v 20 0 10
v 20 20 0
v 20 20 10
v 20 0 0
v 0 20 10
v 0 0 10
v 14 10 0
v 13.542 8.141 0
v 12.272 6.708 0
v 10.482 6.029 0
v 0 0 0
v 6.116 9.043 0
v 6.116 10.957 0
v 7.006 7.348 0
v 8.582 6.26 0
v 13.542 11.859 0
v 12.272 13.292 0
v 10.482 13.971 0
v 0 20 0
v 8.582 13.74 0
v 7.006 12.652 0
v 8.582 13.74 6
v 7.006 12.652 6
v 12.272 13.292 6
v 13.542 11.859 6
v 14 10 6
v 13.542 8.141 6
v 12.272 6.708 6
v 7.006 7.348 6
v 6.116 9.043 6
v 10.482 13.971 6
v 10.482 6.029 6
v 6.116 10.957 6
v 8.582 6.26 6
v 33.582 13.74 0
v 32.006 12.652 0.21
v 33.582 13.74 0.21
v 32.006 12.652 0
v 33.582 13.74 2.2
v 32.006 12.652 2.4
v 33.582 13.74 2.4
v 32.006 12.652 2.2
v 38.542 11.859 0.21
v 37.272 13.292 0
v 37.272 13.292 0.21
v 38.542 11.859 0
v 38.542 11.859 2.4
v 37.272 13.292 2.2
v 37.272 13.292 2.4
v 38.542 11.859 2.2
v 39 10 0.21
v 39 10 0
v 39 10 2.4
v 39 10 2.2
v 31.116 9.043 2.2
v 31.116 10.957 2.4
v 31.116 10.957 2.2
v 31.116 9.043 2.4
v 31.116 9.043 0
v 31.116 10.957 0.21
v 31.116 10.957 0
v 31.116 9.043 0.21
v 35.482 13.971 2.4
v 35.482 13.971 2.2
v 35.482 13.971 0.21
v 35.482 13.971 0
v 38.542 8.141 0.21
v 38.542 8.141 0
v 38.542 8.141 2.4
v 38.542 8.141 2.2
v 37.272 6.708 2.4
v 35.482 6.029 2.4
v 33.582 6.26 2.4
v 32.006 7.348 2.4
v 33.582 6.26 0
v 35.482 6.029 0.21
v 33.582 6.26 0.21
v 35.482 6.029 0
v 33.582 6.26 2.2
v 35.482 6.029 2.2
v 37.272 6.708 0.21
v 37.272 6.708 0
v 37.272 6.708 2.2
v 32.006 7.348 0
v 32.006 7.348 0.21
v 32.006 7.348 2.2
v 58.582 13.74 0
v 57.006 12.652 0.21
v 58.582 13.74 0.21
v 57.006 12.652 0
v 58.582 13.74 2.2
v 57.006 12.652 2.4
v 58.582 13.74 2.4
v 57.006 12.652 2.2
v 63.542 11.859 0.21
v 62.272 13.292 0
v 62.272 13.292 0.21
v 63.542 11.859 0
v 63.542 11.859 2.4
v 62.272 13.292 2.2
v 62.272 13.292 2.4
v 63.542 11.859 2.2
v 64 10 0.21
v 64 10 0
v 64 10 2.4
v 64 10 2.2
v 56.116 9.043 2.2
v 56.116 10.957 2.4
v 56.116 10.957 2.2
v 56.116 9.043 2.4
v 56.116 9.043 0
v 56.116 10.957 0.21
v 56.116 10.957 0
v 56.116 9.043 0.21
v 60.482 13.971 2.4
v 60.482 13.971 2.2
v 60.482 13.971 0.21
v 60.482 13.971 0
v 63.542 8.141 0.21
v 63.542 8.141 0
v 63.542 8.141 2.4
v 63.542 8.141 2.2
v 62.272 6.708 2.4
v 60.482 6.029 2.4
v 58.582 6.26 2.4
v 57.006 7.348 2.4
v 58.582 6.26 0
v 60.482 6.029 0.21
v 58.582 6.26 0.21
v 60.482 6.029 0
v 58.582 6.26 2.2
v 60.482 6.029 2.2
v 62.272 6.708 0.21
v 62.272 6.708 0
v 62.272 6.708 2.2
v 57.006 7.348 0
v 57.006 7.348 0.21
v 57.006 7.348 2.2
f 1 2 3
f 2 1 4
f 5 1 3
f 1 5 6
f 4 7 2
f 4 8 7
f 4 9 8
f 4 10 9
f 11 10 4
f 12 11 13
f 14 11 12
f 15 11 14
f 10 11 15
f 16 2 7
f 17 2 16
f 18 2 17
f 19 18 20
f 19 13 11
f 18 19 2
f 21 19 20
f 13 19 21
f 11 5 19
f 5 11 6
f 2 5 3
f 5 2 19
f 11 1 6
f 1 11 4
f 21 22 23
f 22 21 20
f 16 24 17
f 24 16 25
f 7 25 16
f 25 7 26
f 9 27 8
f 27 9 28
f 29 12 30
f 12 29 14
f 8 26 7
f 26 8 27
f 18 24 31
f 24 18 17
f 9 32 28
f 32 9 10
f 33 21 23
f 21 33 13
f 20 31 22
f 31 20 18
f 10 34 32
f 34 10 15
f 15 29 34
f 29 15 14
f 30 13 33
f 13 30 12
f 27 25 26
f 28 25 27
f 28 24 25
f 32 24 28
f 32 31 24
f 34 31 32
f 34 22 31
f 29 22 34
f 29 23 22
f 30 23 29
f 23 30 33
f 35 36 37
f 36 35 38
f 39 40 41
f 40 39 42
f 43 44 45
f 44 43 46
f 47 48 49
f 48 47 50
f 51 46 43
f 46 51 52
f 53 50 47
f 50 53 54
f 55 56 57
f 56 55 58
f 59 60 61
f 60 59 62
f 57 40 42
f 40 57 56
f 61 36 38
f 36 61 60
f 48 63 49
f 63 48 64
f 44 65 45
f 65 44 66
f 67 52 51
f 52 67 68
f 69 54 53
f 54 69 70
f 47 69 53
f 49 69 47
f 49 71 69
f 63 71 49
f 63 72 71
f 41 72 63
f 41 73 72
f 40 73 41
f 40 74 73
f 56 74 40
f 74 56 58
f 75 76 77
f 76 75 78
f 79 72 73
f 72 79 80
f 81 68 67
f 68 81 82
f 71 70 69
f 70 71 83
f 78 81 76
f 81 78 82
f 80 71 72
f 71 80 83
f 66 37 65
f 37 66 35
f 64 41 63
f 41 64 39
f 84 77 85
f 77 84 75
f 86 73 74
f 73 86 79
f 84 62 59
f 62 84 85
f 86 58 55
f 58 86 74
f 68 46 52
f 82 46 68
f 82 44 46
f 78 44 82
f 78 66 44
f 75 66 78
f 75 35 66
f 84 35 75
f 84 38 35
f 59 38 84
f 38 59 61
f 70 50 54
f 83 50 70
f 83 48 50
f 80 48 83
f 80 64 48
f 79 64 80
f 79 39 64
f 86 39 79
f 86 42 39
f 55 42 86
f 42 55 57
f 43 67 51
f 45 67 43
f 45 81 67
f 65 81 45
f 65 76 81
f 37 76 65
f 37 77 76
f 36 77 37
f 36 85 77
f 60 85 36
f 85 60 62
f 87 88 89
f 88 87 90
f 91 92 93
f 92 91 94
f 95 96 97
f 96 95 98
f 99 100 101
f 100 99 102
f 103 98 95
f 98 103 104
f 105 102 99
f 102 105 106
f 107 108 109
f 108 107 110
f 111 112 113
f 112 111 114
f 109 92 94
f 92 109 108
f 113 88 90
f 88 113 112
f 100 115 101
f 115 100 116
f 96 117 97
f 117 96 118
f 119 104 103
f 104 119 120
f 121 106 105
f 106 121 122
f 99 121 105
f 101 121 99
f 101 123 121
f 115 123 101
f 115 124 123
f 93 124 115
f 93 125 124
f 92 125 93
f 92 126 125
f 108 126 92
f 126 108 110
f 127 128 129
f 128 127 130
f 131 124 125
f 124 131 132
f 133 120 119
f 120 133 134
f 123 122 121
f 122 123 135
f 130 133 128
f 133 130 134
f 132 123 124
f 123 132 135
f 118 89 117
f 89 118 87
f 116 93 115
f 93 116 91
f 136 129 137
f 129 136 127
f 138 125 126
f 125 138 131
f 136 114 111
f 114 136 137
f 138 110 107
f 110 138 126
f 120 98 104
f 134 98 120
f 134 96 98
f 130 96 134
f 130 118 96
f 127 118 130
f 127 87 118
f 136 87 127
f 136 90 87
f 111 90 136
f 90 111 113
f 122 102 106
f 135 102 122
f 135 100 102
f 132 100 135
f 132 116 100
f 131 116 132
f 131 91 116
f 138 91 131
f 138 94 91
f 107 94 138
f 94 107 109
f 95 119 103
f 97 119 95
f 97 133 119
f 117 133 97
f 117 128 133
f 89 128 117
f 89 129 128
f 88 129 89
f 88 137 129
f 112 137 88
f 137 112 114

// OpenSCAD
// Simple cavity test to debug slicer recognition
include <../src/core/standard.scad>

module basic_through_hole() {
    // Most basic through hole possible - explicitly centered
    difference() {
        cube([20, 20, 10]);
        translate([10, 10, 0])  // Center the cylinder in the cube
        cylinder(h=12, r=4, center=true);
    }
}

module basic_enclosed_cavity() {
    // UNIFIED cavity structure: solid base → hollow cavity → solid bridge
    translate([10, 10, 0]) {
        difference() {
            // SOLID container: base + walls + bridge (2.4mm total)
            cylinder(h=2.4, r=4);

            // Cut out cavity space starting SLIGHTLY above base (layers 2-10)
            // This ensures first layer is completely solid
            translate([0, 0, 0.21])  // Start cavity slightly above base
            cylinder(h=1.99, r=4);   // 2mm cavity, slightly less to avoid bottom
        }
    }
}

module bridged_cavity() {
    // Same unified structure as basic_enclosed_cavity
    translate([10, 10, 0]) {
        difference() {
            // SOLID container: base + walls + bridge (2.4mm total)
            cylinder(h=2.4, r=4);

            // Cut out cavity space starting SLIGHTLY above base (layers 2-10)
            translate([0, 0, 0.21])  // Start cavity slightly above base
            cylinder(h=1.99, r=4);   // 2mm cavity, slightly less to avoid bottom
        }
    }
}

basic_through_hole();
translate([25, 0, 0]) basic_enclosed_cavity();
translate([50, 0, 0]) bridged_cavity();
